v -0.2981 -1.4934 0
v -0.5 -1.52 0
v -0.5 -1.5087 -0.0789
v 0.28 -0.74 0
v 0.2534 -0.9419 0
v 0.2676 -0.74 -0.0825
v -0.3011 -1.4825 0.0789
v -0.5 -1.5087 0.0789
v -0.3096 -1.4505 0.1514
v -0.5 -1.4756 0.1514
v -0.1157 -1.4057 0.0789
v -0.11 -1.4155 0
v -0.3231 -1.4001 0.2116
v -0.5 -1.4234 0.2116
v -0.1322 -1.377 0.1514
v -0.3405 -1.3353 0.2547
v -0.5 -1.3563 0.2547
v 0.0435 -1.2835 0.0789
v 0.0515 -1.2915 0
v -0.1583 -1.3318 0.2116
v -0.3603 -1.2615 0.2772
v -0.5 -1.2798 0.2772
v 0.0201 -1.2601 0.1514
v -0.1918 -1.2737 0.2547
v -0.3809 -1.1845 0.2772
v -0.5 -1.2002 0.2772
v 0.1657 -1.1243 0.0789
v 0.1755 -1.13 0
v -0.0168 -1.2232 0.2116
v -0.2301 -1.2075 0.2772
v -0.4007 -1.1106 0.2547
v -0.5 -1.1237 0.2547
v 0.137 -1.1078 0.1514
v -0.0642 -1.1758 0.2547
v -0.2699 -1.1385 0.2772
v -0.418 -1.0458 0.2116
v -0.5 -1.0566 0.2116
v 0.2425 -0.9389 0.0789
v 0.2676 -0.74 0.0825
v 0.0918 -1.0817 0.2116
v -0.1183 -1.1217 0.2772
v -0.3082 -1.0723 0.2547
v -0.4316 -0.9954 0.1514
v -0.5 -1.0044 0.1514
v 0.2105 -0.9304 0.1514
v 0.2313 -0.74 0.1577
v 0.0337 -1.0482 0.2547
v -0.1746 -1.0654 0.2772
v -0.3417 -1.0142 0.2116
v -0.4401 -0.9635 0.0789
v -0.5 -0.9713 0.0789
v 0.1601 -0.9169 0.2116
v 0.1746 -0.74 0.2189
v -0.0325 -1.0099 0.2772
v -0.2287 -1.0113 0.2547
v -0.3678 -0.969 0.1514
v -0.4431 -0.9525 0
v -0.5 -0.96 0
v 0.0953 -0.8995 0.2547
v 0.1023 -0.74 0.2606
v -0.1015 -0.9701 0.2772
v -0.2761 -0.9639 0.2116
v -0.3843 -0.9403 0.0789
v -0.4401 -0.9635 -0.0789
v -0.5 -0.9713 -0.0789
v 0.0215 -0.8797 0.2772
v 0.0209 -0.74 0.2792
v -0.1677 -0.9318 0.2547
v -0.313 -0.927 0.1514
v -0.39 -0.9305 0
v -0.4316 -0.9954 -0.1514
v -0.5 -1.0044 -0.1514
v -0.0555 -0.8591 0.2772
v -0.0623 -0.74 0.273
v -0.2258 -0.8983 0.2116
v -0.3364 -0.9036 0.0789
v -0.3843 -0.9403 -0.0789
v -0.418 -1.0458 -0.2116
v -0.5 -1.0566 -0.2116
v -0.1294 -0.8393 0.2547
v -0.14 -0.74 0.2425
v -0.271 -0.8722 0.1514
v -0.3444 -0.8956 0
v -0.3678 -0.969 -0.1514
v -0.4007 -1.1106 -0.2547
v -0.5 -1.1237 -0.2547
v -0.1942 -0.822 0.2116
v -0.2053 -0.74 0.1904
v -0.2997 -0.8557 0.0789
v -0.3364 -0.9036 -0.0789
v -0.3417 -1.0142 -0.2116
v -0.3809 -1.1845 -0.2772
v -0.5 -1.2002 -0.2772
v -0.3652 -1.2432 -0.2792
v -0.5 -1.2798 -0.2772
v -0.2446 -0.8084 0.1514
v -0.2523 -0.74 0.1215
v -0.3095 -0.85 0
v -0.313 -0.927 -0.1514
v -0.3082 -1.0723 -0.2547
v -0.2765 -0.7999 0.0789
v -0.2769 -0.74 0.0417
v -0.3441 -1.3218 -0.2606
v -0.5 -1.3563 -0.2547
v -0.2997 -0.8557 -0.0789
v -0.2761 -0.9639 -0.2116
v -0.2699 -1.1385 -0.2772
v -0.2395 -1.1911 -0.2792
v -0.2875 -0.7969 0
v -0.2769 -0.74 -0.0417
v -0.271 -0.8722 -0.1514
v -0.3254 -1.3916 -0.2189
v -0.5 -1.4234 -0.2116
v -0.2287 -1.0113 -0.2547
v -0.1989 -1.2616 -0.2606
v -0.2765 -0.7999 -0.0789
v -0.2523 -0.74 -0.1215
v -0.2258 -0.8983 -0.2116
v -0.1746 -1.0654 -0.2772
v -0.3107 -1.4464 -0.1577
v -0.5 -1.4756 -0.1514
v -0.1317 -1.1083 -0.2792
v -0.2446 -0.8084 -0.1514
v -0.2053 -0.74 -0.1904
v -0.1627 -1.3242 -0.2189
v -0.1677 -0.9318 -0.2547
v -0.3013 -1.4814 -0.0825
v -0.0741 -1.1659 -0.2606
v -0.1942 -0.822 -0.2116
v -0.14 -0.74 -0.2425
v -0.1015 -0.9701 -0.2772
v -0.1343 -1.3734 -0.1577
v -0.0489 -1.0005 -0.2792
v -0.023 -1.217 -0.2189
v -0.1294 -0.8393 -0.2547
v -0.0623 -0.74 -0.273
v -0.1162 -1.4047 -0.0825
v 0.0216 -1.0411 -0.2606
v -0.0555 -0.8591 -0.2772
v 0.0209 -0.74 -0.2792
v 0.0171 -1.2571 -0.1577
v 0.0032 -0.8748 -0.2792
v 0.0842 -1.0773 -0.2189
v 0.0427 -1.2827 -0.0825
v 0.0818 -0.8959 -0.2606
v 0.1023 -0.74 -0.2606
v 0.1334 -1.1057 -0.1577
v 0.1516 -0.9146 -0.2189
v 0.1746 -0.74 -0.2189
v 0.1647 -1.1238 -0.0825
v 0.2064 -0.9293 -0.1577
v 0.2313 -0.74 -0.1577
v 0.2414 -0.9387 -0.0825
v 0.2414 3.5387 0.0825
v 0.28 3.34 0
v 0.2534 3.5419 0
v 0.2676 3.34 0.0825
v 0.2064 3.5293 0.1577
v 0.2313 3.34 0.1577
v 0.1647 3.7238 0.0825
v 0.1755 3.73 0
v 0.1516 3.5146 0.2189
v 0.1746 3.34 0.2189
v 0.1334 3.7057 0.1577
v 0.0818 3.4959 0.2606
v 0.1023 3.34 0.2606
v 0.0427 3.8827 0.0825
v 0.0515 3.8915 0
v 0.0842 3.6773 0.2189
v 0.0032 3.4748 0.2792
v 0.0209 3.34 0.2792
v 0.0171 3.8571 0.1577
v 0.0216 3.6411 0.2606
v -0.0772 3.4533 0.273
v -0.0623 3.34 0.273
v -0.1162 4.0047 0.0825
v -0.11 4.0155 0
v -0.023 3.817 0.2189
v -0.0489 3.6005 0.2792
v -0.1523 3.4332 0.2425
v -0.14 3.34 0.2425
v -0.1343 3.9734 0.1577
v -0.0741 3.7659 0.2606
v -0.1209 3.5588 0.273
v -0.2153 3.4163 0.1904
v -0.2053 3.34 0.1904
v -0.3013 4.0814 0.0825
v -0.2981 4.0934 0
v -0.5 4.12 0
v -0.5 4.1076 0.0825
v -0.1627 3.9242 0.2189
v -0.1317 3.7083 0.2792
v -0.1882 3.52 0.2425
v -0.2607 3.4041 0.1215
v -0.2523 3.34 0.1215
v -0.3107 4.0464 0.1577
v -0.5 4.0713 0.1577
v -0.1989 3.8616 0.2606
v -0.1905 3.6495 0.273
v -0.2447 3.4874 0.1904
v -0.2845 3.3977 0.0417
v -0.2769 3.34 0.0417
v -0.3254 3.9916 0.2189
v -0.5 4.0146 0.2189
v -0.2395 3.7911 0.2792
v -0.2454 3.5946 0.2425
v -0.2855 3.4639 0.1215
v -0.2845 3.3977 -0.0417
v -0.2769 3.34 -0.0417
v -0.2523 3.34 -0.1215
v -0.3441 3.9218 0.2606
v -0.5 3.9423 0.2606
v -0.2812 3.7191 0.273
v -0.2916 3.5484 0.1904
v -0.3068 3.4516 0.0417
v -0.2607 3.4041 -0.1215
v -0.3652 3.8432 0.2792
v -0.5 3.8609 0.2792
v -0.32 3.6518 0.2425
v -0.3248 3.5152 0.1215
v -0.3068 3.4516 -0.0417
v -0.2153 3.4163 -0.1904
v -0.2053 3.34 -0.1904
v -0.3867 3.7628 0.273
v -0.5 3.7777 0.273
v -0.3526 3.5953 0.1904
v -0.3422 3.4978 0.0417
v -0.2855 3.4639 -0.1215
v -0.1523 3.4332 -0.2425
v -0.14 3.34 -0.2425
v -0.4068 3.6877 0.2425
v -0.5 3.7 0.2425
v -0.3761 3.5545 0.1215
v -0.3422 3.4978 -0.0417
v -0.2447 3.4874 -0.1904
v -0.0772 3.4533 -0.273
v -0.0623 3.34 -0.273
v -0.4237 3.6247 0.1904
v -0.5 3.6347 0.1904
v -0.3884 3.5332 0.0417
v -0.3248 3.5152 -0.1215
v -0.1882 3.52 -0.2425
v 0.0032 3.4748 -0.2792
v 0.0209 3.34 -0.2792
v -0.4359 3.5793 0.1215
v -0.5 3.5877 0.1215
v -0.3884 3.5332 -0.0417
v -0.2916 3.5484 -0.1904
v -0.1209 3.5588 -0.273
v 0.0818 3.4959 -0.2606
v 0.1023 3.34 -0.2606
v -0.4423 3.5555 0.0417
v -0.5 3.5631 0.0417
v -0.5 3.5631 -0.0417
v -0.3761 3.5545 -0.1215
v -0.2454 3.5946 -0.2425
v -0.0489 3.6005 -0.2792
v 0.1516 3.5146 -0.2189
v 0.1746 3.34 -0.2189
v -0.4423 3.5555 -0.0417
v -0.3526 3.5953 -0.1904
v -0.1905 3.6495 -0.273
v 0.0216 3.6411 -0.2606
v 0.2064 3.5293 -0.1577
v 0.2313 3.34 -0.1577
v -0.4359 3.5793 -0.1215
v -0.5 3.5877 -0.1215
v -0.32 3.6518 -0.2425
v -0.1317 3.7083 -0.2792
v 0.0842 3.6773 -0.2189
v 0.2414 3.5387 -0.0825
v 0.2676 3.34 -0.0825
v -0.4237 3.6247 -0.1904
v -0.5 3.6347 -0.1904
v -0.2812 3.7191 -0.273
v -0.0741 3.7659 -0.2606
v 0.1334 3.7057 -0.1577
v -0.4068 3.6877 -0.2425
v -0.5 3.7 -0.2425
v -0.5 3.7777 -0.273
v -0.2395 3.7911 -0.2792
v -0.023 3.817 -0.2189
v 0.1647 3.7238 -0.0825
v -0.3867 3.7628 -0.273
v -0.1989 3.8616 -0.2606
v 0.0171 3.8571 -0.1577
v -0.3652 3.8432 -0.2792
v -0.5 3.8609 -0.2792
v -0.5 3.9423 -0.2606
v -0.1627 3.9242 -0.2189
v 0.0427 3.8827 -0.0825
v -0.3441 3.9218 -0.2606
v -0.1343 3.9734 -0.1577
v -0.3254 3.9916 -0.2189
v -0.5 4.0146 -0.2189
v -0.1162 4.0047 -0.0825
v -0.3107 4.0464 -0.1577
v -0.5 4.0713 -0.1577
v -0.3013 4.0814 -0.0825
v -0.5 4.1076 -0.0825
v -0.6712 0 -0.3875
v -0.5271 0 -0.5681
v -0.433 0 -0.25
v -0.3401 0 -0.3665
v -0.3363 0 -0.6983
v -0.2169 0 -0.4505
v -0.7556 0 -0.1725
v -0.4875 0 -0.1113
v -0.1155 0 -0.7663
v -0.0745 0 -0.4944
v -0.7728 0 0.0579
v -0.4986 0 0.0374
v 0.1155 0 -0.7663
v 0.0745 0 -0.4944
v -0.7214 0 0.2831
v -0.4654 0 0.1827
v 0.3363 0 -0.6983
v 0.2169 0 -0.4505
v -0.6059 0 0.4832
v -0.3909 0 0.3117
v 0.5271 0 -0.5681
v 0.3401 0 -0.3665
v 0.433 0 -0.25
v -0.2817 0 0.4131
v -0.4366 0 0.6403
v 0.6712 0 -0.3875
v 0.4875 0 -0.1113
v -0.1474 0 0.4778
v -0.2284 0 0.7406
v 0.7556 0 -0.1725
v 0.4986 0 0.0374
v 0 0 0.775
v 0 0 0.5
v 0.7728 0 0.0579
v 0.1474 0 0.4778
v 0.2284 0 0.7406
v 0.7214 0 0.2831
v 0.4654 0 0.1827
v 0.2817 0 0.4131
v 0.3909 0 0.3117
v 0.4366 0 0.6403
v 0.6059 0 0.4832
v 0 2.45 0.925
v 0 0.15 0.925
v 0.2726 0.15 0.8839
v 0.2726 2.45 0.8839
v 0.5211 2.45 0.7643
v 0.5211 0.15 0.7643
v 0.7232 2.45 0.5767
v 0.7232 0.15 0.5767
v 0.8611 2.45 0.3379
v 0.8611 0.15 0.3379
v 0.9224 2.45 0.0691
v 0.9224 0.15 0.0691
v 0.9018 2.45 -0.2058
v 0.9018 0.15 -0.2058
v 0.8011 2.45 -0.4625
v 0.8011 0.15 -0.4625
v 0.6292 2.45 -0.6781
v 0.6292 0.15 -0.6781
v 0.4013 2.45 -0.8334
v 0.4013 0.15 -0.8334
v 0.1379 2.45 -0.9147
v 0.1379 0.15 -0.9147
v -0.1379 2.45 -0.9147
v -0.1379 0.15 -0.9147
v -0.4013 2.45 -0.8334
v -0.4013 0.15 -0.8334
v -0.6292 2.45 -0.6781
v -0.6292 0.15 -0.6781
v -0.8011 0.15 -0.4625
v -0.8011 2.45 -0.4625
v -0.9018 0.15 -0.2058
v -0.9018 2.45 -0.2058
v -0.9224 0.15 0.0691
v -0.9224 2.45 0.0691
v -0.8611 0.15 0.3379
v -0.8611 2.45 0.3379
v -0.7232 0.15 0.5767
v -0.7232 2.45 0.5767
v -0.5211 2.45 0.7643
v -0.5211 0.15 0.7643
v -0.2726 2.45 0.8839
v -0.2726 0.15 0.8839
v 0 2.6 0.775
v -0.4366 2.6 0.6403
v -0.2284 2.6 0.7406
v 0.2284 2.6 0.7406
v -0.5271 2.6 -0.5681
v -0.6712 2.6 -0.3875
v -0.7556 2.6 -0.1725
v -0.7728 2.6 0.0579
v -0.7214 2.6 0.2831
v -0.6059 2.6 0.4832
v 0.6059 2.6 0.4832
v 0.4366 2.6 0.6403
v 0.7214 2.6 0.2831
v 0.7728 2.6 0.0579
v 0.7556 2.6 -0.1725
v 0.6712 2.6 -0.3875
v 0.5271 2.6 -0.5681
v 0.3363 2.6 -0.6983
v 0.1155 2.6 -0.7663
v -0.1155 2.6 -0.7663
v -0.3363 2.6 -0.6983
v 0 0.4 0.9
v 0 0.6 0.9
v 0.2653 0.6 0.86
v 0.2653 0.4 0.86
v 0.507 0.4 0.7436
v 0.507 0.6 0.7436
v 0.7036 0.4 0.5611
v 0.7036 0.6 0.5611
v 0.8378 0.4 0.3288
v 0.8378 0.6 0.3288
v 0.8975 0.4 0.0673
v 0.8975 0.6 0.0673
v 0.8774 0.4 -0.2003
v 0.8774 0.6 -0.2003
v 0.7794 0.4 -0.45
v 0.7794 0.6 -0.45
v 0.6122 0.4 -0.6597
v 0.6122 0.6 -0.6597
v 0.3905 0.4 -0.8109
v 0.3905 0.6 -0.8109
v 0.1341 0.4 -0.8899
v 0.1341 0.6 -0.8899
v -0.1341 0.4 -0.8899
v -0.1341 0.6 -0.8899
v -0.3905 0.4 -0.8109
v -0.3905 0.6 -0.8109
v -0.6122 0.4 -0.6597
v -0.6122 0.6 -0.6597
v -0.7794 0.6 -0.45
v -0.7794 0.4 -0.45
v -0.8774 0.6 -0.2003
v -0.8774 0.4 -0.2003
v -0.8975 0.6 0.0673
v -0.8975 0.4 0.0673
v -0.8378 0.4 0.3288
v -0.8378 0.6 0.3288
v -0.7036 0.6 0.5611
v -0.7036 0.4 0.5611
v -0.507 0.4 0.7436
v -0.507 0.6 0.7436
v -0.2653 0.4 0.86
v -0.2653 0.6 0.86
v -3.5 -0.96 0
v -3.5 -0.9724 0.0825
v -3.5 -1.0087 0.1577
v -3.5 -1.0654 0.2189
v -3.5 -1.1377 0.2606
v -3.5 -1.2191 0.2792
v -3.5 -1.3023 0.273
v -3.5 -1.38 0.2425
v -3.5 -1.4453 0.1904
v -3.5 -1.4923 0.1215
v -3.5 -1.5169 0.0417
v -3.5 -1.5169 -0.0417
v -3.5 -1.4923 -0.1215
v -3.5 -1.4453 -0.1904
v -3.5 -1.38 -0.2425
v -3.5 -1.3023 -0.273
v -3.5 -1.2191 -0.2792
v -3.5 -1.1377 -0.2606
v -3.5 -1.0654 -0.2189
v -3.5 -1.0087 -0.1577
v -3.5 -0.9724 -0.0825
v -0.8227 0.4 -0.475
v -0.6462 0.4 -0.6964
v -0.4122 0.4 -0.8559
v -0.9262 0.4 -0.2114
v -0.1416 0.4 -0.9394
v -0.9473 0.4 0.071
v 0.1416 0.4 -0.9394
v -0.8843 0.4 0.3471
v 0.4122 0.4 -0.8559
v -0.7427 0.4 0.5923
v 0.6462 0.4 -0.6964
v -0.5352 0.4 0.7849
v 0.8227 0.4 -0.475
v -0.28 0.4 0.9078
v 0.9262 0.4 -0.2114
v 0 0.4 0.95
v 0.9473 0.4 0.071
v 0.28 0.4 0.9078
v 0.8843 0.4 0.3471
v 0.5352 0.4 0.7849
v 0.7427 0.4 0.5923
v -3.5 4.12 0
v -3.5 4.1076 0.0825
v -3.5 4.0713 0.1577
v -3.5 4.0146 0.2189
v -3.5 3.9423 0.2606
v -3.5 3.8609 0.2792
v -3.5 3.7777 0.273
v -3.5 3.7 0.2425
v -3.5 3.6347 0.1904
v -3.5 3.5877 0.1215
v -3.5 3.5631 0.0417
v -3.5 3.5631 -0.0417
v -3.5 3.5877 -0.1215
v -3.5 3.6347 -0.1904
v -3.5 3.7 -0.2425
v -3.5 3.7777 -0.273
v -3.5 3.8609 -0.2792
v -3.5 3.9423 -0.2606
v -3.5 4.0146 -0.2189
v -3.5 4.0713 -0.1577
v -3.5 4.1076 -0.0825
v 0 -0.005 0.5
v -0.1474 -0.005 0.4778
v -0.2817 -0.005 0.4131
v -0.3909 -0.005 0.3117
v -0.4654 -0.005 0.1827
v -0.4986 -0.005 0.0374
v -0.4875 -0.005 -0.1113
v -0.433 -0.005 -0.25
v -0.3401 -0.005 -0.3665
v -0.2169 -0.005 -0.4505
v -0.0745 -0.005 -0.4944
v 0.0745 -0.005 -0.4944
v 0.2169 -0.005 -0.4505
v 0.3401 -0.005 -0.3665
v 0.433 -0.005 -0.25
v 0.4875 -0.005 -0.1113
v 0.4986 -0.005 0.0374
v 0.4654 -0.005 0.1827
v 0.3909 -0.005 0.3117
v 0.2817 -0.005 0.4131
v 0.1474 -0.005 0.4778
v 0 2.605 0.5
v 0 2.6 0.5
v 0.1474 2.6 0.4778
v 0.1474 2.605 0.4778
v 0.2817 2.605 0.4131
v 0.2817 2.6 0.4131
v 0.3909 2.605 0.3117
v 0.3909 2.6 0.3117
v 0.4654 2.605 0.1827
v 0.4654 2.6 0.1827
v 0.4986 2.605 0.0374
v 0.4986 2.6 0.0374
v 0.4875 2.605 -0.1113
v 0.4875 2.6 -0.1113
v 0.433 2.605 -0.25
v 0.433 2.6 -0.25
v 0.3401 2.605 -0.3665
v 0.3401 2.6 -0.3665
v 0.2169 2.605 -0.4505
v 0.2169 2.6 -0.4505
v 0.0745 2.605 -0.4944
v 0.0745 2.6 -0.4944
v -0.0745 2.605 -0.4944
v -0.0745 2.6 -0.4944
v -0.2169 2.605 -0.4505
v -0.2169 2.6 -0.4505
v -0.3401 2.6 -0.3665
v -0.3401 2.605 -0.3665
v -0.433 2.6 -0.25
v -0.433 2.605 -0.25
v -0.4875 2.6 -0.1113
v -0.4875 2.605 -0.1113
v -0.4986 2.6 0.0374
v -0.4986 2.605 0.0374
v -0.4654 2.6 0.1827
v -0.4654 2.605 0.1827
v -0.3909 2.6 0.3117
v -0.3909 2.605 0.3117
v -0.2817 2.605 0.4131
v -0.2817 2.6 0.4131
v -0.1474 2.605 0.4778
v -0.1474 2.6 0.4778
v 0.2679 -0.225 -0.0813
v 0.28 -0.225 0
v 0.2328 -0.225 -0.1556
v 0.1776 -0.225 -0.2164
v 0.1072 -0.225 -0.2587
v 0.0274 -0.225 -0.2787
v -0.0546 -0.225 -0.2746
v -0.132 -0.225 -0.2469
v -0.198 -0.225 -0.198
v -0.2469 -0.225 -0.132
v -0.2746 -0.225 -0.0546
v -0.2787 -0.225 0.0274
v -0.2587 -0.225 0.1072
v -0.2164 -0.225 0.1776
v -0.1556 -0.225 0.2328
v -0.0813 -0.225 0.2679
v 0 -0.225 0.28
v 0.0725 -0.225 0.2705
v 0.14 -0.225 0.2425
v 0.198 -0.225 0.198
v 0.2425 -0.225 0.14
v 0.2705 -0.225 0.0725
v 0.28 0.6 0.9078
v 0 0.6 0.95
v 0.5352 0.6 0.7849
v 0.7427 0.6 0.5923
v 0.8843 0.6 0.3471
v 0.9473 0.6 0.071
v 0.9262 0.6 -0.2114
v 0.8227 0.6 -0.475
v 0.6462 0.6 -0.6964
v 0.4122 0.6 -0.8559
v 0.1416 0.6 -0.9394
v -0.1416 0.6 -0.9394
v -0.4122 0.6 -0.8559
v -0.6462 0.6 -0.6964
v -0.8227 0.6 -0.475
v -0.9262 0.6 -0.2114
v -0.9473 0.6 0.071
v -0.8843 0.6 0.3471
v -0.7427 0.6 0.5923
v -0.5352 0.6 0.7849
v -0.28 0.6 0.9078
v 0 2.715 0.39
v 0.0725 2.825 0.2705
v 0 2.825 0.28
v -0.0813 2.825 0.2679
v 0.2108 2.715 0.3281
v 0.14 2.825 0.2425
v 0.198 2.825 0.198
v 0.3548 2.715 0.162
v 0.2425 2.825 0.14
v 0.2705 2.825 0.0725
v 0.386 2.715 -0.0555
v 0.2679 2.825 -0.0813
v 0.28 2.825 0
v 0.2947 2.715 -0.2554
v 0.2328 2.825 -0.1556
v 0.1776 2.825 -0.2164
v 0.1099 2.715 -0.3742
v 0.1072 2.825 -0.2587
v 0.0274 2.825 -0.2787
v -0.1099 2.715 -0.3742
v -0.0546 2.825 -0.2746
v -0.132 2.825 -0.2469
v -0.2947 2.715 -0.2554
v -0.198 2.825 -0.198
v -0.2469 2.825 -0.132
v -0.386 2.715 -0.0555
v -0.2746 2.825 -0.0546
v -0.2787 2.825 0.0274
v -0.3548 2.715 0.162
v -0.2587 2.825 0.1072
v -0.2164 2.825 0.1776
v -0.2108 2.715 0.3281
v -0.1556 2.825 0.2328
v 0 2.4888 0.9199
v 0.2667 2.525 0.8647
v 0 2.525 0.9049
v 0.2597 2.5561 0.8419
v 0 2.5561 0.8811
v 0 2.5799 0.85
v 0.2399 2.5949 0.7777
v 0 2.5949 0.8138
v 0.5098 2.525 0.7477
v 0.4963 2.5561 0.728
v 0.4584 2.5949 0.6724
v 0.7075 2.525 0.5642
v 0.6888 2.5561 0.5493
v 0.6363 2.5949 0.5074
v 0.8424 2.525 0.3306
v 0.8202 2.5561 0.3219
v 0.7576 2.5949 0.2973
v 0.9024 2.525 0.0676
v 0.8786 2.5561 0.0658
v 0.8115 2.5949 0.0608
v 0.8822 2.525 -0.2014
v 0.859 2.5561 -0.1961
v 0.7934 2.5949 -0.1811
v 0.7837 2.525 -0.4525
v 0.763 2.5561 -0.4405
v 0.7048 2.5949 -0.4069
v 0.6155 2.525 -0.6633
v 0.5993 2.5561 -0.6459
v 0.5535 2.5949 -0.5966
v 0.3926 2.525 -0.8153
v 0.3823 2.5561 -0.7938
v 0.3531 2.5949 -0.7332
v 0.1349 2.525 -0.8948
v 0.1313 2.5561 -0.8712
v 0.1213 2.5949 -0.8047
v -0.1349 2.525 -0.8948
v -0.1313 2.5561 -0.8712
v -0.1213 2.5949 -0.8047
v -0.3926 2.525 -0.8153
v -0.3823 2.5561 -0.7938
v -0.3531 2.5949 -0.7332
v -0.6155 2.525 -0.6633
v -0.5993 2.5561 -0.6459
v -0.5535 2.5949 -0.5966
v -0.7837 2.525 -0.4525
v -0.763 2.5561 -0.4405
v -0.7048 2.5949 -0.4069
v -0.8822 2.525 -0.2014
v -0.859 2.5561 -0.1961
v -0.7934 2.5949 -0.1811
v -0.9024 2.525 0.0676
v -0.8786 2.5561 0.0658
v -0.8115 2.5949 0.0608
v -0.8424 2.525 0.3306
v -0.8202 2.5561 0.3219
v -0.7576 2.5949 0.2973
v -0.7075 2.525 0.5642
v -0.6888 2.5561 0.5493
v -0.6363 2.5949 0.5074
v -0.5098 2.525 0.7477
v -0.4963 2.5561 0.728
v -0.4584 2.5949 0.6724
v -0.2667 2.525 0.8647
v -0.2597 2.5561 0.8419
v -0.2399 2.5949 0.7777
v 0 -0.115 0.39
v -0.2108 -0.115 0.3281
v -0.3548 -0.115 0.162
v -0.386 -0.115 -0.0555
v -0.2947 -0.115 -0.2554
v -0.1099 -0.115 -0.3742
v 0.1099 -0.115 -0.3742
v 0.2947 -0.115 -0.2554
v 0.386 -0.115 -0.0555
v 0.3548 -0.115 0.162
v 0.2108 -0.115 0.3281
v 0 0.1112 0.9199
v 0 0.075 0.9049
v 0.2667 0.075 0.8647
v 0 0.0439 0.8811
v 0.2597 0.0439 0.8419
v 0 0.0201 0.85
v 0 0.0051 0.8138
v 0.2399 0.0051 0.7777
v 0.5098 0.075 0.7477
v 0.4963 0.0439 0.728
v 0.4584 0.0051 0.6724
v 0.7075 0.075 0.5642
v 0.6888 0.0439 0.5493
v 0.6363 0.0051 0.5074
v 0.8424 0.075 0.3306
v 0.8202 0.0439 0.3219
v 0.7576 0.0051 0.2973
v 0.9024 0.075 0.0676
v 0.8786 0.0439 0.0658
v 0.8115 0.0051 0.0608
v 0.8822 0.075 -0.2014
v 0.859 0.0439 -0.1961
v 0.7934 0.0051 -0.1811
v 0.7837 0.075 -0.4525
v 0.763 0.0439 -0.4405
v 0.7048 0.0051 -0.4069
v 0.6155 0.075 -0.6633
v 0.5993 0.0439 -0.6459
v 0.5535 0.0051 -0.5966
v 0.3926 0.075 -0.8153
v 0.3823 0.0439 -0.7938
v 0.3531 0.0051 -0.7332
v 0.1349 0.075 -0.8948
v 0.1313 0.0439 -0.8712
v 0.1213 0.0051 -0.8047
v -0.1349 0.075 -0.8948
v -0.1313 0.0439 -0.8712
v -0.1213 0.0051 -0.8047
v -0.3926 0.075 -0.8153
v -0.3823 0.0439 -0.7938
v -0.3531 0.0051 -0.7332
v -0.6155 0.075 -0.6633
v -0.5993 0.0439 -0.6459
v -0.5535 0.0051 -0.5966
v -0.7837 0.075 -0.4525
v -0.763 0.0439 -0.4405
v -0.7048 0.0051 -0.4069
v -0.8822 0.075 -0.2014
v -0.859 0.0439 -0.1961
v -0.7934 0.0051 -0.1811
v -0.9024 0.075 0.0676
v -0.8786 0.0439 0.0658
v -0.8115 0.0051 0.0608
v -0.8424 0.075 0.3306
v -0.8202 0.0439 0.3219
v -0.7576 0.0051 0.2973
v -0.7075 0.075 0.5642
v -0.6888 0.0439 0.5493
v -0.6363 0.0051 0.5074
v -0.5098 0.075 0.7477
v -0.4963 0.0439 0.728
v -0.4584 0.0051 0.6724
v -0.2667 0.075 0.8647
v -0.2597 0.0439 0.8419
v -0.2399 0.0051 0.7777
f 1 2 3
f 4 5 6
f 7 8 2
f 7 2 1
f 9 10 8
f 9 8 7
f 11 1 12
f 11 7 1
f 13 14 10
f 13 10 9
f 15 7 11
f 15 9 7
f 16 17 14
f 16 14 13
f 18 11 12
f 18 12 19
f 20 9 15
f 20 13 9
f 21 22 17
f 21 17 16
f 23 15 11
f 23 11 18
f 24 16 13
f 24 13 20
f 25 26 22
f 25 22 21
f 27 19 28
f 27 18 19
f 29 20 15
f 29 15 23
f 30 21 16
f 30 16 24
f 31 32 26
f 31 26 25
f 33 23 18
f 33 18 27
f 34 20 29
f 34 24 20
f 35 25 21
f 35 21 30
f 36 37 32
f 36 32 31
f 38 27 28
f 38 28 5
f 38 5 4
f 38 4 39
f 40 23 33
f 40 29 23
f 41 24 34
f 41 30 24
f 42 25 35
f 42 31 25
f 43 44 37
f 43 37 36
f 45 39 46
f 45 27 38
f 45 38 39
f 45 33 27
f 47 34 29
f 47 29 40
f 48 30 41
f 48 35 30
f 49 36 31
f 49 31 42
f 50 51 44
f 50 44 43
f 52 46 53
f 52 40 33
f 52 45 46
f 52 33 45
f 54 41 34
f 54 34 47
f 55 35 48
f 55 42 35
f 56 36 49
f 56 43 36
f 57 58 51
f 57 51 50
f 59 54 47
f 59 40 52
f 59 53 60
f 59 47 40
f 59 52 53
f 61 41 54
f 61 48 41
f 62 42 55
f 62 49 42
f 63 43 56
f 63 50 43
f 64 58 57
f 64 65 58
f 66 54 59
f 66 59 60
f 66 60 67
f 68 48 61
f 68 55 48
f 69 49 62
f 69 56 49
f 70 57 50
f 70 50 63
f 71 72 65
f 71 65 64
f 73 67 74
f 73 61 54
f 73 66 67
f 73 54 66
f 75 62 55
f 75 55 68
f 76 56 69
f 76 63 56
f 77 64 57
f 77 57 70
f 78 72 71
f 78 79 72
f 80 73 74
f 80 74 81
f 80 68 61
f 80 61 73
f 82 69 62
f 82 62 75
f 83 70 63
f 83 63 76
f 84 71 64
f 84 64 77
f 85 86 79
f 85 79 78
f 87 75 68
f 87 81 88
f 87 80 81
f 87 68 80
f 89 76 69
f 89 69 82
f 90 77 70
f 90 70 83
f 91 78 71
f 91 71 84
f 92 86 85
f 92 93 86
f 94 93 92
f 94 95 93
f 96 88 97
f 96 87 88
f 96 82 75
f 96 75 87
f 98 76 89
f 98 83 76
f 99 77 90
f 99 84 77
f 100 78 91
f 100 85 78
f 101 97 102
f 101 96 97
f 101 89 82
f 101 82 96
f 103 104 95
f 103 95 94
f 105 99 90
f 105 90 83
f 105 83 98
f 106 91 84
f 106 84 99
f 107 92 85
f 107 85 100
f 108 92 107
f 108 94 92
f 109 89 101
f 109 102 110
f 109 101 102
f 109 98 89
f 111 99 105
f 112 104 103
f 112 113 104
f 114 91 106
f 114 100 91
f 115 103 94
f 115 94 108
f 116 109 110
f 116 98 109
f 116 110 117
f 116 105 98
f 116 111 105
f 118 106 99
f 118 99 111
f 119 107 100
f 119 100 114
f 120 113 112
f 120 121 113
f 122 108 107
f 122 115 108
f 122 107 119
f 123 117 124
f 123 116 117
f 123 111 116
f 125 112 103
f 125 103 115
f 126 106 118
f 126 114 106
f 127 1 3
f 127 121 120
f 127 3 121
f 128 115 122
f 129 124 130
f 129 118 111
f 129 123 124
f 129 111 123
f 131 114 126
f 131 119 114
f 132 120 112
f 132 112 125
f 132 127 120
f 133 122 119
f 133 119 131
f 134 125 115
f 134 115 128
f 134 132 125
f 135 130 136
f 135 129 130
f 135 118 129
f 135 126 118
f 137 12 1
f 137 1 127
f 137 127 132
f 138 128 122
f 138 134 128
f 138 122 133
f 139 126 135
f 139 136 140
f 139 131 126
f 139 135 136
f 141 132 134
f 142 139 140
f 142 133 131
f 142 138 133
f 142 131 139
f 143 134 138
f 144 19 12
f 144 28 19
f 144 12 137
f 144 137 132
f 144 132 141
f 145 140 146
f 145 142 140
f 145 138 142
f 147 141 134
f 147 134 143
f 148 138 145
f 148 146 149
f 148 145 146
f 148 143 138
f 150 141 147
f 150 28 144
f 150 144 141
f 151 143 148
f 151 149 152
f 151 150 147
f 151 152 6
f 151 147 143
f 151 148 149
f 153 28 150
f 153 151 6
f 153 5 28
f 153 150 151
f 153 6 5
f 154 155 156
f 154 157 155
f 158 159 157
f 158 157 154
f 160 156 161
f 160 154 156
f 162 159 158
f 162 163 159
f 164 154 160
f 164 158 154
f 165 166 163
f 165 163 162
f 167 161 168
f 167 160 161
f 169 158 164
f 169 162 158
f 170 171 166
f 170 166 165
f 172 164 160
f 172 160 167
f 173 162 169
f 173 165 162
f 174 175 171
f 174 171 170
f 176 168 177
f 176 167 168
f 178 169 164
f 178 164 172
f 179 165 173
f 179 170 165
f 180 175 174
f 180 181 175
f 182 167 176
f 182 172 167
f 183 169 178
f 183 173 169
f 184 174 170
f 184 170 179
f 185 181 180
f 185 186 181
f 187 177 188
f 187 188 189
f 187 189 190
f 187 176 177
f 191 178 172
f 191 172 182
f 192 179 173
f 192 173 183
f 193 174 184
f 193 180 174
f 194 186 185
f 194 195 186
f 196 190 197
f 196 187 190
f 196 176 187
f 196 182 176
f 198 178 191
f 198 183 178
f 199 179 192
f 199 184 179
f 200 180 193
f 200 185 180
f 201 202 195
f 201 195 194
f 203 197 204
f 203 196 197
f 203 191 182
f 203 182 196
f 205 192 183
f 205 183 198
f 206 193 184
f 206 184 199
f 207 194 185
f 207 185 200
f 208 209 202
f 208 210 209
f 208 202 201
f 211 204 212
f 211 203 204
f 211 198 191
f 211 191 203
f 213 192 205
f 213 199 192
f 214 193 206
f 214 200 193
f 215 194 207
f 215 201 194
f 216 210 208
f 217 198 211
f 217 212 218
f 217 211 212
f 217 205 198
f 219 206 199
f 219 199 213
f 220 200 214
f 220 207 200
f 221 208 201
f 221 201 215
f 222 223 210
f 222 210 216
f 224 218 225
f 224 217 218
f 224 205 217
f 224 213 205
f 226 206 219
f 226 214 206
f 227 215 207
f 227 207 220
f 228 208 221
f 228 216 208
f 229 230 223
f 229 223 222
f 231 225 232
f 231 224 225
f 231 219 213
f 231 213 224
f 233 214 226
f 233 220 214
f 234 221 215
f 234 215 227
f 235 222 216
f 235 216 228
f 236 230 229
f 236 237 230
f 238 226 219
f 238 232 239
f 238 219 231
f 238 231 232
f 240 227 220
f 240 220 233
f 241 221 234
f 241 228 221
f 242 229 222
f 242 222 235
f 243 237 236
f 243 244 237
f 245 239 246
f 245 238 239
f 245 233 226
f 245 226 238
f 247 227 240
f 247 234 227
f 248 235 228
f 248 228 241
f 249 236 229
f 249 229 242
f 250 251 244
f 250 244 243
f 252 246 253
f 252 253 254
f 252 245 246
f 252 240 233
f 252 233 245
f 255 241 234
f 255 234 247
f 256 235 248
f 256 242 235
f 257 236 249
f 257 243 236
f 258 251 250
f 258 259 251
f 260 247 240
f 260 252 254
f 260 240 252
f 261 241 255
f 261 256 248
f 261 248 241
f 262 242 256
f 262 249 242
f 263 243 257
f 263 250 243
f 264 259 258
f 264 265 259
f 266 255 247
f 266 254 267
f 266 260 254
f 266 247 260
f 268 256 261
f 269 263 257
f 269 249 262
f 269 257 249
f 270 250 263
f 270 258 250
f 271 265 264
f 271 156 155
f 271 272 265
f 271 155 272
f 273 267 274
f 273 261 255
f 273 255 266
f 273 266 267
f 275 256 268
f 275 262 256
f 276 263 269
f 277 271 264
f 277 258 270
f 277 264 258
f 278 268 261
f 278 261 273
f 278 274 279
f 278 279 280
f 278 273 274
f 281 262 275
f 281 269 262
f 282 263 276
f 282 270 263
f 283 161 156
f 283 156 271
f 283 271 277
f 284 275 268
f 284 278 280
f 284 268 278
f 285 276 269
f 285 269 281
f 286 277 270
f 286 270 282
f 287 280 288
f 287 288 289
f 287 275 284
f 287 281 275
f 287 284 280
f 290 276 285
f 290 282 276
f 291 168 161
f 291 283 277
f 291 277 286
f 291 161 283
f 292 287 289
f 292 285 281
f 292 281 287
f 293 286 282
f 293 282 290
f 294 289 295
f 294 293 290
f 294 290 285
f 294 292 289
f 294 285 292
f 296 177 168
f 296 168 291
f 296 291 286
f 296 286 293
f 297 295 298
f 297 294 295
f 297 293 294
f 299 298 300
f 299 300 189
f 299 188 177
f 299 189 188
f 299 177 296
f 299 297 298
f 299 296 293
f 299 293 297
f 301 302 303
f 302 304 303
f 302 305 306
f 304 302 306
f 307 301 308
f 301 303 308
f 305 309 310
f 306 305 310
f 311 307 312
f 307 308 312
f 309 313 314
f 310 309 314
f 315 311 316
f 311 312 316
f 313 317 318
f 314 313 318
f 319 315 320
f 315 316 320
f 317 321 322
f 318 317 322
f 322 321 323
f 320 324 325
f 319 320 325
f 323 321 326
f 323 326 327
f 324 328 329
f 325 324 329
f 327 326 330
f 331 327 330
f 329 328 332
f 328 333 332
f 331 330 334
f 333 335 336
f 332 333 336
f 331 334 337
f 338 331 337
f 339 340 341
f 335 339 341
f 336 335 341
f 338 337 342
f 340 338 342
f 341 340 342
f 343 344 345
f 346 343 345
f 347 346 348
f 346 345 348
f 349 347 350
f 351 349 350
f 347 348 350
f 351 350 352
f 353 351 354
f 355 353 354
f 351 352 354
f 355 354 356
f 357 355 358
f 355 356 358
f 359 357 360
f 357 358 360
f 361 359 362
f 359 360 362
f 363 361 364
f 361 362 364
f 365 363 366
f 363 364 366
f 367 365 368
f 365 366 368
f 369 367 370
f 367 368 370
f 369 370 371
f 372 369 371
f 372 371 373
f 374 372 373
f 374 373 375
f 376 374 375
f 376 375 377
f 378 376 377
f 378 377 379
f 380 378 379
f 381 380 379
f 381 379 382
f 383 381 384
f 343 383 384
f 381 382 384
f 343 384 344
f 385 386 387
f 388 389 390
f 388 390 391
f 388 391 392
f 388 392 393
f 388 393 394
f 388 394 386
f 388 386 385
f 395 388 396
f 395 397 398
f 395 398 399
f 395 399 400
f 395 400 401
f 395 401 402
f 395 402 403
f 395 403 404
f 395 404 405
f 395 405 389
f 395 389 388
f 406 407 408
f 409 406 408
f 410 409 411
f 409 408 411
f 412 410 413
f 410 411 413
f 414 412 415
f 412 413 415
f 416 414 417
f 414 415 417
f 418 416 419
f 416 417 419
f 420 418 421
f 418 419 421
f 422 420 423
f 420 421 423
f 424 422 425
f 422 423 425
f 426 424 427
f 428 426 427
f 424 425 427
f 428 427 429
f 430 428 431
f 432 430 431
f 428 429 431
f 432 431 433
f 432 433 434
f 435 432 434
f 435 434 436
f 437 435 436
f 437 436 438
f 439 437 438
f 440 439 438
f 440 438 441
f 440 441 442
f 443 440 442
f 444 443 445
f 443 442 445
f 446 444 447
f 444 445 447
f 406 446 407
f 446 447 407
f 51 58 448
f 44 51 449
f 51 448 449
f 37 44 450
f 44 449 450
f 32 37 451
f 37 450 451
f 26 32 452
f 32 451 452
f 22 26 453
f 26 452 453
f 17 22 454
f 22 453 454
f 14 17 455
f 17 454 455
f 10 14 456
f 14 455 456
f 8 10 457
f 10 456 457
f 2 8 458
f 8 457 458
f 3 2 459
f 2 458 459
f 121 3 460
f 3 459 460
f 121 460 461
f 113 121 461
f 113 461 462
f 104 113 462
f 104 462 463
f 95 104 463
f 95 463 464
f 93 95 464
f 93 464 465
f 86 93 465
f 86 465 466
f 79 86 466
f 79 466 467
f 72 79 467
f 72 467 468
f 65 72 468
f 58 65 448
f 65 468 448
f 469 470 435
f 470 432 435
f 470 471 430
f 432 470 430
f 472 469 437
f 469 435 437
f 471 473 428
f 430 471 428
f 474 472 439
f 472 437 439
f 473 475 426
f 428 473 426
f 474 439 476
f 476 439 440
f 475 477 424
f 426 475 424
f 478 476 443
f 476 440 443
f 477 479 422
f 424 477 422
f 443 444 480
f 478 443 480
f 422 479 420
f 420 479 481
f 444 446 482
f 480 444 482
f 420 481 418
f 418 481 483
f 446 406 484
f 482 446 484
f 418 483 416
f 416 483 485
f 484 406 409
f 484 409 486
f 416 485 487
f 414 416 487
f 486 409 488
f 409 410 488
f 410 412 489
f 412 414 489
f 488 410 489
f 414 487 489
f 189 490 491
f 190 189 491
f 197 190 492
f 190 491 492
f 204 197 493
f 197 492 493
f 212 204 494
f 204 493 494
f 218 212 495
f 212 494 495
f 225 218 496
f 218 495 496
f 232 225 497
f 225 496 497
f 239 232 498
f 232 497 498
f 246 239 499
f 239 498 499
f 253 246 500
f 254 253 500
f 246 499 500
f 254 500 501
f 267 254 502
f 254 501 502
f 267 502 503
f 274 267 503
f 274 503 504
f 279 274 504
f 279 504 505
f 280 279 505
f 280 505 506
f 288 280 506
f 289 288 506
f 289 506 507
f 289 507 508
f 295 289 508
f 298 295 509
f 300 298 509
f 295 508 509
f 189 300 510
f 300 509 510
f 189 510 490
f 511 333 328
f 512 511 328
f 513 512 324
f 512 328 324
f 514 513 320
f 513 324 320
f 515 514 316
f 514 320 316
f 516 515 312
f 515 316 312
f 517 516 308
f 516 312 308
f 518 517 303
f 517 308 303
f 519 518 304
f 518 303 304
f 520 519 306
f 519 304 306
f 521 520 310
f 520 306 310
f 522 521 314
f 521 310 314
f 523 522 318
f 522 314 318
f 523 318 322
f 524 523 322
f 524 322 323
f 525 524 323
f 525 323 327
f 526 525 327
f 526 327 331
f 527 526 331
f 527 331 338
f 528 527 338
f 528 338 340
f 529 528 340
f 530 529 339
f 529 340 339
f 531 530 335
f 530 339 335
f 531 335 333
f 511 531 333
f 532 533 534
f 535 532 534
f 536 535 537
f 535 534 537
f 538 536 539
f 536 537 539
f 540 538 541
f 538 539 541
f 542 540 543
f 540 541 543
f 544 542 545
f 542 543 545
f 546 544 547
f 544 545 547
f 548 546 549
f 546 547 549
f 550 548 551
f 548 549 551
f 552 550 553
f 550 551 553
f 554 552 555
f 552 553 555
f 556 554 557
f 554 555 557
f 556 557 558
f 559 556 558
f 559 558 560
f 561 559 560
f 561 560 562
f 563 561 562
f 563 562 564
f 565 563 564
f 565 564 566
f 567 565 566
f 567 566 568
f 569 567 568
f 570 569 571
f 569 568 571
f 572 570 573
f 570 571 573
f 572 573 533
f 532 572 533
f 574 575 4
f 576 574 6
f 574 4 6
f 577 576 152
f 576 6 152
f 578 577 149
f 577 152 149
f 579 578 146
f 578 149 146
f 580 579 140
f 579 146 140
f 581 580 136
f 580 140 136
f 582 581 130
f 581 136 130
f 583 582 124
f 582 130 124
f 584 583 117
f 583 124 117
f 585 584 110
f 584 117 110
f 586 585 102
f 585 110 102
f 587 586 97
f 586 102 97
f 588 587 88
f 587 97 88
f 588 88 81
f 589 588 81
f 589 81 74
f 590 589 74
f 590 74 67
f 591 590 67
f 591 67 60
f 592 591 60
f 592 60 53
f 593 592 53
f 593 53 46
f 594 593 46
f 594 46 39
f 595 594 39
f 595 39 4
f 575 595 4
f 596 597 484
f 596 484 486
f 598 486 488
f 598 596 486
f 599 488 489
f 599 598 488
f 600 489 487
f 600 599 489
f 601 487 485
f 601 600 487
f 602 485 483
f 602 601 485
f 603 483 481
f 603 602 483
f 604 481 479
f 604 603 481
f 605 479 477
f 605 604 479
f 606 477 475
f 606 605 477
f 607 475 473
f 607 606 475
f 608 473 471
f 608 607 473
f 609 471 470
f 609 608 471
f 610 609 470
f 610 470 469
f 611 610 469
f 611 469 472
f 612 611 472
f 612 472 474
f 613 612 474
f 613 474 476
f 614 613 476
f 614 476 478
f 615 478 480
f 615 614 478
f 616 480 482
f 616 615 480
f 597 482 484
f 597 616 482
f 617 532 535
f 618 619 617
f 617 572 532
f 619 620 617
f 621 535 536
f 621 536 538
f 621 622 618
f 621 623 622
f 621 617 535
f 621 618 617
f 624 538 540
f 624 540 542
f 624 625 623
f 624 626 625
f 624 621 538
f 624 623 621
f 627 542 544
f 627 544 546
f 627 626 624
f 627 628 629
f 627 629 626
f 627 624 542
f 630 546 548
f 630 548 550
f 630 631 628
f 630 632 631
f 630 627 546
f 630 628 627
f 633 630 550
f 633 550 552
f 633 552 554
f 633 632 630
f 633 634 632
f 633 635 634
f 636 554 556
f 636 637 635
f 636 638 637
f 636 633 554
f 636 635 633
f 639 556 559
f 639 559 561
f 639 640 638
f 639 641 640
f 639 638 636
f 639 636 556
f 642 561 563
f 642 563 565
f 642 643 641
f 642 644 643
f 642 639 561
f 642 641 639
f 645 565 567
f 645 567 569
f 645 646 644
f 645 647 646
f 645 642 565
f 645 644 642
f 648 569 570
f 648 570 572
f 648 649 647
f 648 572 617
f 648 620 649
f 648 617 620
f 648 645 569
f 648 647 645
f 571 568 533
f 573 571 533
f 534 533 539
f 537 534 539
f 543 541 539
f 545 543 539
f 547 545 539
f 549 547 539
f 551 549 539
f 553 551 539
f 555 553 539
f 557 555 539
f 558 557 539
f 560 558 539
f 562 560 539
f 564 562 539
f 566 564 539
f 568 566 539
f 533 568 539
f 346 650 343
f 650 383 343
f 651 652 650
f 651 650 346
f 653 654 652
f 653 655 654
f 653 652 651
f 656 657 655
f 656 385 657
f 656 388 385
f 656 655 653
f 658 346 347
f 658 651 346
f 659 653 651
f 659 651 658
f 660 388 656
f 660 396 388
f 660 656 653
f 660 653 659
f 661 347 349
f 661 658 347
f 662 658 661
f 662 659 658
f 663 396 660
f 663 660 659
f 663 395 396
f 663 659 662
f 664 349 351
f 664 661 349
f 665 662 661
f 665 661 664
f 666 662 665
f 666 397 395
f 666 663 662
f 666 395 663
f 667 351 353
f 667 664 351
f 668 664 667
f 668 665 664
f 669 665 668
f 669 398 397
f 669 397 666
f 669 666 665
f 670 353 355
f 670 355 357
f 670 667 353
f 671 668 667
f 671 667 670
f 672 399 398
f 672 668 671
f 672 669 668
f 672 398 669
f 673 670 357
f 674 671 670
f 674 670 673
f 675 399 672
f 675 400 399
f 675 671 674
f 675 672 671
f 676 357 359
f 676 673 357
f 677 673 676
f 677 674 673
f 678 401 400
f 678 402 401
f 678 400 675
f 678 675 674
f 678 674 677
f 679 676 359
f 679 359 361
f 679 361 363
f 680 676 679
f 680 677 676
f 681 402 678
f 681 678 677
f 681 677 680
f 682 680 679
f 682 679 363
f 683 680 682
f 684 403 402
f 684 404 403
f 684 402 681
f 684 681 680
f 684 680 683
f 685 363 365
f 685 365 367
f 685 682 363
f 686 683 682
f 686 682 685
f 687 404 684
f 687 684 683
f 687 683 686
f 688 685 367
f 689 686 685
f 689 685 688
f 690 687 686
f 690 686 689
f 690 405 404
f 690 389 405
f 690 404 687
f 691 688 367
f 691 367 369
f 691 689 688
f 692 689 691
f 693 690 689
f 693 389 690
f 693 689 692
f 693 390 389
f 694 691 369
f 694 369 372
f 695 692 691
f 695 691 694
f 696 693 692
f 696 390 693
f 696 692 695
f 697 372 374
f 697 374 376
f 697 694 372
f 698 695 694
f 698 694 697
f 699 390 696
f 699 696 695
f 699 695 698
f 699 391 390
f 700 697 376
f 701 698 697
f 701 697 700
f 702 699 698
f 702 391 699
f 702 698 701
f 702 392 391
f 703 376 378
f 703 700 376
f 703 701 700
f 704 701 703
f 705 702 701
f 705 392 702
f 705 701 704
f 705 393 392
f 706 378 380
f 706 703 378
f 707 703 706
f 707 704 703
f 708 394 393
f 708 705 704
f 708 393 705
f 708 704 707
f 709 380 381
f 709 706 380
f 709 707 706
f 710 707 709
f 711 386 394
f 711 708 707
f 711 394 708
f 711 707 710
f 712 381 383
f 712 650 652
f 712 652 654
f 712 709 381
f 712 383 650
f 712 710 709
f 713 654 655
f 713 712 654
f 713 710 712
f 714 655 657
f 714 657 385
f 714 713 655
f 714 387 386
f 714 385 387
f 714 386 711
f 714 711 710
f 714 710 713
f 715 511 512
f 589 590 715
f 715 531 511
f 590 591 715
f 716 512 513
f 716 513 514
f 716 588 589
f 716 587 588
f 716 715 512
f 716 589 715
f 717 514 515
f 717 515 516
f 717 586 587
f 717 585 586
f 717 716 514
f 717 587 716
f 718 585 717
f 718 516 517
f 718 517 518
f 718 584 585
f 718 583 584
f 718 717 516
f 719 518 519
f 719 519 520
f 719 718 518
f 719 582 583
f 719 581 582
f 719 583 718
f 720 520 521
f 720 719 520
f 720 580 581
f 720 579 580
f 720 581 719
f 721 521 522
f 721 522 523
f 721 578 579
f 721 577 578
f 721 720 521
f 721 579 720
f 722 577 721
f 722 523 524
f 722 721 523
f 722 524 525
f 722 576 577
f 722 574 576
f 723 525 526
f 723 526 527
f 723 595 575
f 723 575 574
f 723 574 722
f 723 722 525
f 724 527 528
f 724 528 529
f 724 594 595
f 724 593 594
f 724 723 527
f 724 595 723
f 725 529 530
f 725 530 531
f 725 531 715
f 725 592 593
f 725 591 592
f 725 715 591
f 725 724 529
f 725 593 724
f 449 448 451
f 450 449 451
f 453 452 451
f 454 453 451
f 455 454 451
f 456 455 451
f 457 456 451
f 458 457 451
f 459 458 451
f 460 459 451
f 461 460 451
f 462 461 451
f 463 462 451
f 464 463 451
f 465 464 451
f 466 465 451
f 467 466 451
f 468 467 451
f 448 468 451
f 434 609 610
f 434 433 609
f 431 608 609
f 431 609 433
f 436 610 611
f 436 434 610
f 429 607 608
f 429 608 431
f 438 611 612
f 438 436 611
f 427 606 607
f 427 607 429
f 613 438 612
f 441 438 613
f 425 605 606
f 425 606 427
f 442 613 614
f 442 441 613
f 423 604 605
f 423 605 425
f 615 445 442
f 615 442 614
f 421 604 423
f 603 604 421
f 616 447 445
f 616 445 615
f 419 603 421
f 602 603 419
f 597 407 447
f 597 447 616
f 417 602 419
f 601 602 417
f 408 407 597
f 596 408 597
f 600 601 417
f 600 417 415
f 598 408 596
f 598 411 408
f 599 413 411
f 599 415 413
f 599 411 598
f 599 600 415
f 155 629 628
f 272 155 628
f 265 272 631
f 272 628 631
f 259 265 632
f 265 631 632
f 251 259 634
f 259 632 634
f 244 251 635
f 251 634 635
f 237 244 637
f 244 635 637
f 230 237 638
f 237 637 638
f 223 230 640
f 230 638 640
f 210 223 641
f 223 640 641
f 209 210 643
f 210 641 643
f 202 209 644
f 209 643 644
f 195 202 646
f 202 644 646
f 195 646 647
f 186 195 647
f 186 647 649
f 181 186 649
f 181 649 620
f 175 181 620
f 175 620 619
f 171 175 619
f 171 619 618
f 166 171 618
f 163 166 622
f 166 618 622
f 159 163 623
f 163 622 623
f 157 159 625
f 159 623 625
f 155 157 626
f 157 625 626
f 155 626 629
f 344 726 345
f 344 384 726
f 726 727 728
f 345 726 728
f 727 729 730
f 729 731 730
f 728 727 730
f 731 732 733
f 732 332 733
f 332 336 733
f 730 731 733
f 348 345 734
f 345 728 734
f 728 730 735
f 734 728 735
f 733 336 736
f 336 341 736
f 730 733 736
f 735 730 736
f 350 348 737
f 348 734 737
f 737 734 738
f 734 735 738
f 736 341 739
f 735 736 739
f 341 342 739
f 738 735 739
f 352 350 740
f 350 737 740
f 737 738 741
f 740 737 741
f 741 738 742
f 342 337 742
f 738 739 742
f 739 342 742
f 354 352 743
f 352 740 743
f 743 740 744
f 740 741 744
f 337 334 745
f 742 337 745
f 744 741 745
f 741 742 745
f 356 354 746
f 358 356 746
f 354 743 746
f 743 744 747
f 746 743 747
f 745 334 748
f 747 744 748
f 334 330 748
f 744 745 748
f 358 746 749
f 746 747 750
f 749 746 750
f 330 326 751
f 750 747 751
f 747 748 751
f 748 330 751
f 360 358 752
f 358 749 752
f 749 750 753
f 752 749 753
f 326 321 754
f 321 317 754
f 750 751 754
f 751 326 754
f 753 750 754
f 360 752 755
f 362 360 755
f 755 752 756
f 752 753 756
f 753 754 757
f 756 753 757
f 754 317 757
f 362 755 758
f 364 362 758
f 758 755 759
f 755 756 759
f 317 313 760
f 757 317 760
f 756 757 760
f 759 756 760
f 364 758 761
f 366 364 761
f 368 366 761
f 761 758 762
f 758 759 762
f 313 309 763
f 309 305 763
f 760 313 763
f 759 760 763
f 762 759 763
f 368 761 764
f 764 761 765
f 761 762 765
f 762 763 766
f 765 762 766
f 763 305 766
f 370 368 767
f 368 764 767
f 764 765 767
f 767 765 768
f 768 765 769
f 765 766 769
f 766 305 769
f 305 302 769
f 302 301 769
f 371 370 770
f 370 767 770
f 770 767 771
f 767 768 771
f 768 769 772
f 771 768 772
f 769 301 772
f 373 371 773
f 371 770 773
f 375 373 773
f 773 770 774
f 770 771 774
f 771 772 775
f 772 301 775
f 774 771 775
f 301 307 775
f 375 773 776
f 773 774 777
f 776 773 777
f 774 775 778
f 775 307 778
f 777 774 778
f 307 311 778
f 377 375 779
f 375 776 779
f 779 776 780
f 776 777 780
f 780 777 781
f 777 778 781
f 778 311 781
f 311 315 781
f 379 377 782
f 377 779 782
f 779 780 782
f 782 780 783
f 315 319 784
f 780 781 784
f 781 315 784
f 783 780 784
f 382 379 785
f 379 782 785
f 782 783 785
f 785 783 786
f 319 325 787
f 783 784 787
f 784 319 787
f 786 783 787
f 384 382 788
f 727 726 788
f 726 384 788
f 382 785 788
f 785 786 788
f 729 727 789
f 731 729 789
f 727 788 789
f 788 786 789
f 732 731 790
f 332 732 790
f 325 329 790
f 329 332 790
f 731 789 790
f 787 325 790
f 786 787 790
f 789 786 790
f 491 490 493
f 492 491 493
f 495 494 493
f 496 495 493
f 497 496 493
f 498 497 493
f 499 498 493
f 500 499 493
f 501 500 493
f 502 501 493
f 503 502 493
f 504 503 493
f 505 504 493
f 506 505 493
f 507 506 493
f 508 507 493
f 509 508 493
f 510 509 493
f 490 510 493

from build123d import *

# Parameters (mm, degrees)
SKETCH1_R               = 0.925
BOSS_EXTRUDE1_DEPTH     = 2.6
SKETCH2_R               = 0.5
BOSS_EXTRUDE2_DEPTH     = 0.225
CHAMFER2_SIZE           = 0.22
FILLET1_R               = 0.15
FILLET2_R               = 0.15
SKETCH10_R              = 0.95
SKETCH10_R_2            = 0.9
BOSS_EXTRUDE9_DEPTH     = 0.2
BARRER2_OUTLINE_R       = 0.28
BARRER2_ANGLE           = 90
BARRER2_START           = 2.825
BARRER2_2_OUTLINE_R     = 0.28
BARRER2_2_DEPTH         = 0.5150001
BARRER2_START_2         = -3.5
BARRER2_3_OUTLINE_R     = 0.28
BARRER2_3_DEPTH         = 3.0000001
CROQUIS7_R              = 0.5
SALIENTE_EXTRUIR1_DEPTH = 0.225
CHAFL_N1_SIZE           = 0.22
BARRER3_OUTLINE_R       = 0.28
BARRER3_ANGLE           = 90
BARRER3_START           = -0.7400001
BARRER3_2_OUTLINE_R     = 0.28
BARRER3_2_DEPTH         = 1.7400001
BARRER3_START_2         = -3.5
BARRER3_3_OUTLINE_R     = 0.28
BARRER3_3_DEPTH         = 3.0000001


with BuildPart() as part:
    # Sketch1 → Boss-Extrude1 (new body)
    with BuildSketch(Plane(origin=(0, 0, 0), x_dir=(1, 0, 0), z_dir=(0, 1, 0))):
        with Locations(Location((0, 0, 0), (0, 0, 270))):
            Circle(SKETCH1_R)
    extrude(amount=BOSS_EXTRUDE1_DEPTH)

    # Fillet1
    fillet1_edges = [part.edges().sort_by_distance(p)[0] for p in [
        (0, 2.6, -0.925),
    ]]
    fillet(fillet1_edges, radius=FILLET1_R)

    # Fillet2
    fillet2_edges = [part.edges().sort_by_distance(p)[0] for p in [
        (0, 0, -0.925),
    ]]
    fillet(fillet2_edges, radius=FILLET2_R)

    # Croquis7 → Saliente-Extruir1 (add)
    with BuildSketch(Plane.XZ):
        with Locations(Location((0, 0, 0), (0, 0, 90))):
            Circle(CROQUIS7_R)
    extrude(amount=SALIENTE_EXTRUIR1_DEPTH)

    # Chaflán1
    chafl_n1_edges = [part.edges().sort_by_distance(p)[0] for p in [
        (0, -0.225, -0.5),
    ]]
    chamfer(chafl_n1_edges, length=CHAFL_N1_SIZE)

    # Barrer3: read off the stored shape, not the designer's step
    # Barrer3 outline → Barrer3 (revolve)
    with BuildSketch(Plane(origin=(-0.5, -0.74, 0), x_dir=(0, -1, 0), z_dir=(-1, 0, 0))):
        with Locations((0.5, 0)):
            Circle(BARRER3_OUTLINE_R)
    revolve(axis=Axis((-0.5, -0.74, 0), (0, 0, 1)), revolution_arc=BARRER3_ANGLE)

    # Barrer3 2 outline → Barrer3 2 (add)
    with BuildSketch(Plane(origin=(0, 0, 0), x_dir=(1, 0, 0), z_dir=(0, 1, 0)).offset(BARRER3_START)):
        Circle(BARRER3_2_OUTLINE_R)
    extrude(amount=BARRER3_2_DEPTH)

    # Barrer3 3 outline → Barrer3 3 (add)
    with BuildSketch(Plane.YZ.offset(BARRER3_START_2)):
        with Locations((-1.24, 0)):
            Circle(BARRER3_3_OUTLINE_R)
    extrude(amount=BARRER3_3_DEPTH)


with BuildPart() as body_2:
    # Sketch2 → Boss-Extrude2 (new body)
    with BuildSketch(Plane(origin=(0, 2.6, 0), x_dir=(1, 0, 0), z_dir=(0, 1, 0))):
        with Locations(Location((0, 0, 0), (0, 0, 270))):
            Circle(SKETCH2_R)
    extrude(amount=BOSS_EXTRUDE2_DEPTH)

    # Chamfer2
    chamfer2_edges = [body_2.edges().sort_by_distance(p)[0] for p in [
        (0, 2.825, -0.5),
    ]]
    chamfer(chamfer2_edges, length=CHAMFER2_SIZE)

    # Barrer2: read off the stored shape, not the designer's step
    # Barrer2 outline → Barrer2 (revolve)
    with BuildSketch(Plane(origin=(-0.5, 3.34, 0), x_dir=(1, 0, 0), z_dir=(0, -1, 0))):
        with Locations((0.5, 0)):
            Circle(BARRER2_OUTLINE_R)
    revolve(axis=Axis((-0.5, 3.34, 0), (0, 0, 1)), revolution_arc=BARRER2_ANGLE)

    # Barrer2 2 outline → Barrer2 2 (add)
    with BuildSketch(Plane(origin=(0, 0, 0), x_dir=(1, 0, 0), z_dir=(0, 1, 0)).offset(BARRER2_START)):
        Circle(BARRER2_2_OUTLINE_R)
    extrude(amount=BARRER2_2_DEPTH)

    # Barrer2 3 outline → Barrer2 3 (add)
    with BuildSketch(Plane.YZ.offset(BARRER2_START_2)):
        with Locations((3.84, 0)):
            Circle(BARRER2_3_OUTLINE_R)
    extrude(amount=BARRER2_3_DEPTH)


with BuildPart() as body_3:
    # Sketch10 → Boss-Extrude9 (new body)
    with BuildSketch(Plane(origin=(0, 0.6, 0), x_dir=(-1, 0, 0), z_dir=(0, 1, 0))):
        with Locations(Location((0, 0, 0), (0, 0, 90))):
            Circle(SKETCH10_R)
        with Locations(Location((0, 0, 0), (0, 0, 90))):
            Circle(SKETCH10_R_2, mode=Mode.SUBTRACT)
    extrude(amount=-BOSS_EXTRUDE9_DEPTH)


solid = Compound([part.part, body_2.part, body_3.part])
